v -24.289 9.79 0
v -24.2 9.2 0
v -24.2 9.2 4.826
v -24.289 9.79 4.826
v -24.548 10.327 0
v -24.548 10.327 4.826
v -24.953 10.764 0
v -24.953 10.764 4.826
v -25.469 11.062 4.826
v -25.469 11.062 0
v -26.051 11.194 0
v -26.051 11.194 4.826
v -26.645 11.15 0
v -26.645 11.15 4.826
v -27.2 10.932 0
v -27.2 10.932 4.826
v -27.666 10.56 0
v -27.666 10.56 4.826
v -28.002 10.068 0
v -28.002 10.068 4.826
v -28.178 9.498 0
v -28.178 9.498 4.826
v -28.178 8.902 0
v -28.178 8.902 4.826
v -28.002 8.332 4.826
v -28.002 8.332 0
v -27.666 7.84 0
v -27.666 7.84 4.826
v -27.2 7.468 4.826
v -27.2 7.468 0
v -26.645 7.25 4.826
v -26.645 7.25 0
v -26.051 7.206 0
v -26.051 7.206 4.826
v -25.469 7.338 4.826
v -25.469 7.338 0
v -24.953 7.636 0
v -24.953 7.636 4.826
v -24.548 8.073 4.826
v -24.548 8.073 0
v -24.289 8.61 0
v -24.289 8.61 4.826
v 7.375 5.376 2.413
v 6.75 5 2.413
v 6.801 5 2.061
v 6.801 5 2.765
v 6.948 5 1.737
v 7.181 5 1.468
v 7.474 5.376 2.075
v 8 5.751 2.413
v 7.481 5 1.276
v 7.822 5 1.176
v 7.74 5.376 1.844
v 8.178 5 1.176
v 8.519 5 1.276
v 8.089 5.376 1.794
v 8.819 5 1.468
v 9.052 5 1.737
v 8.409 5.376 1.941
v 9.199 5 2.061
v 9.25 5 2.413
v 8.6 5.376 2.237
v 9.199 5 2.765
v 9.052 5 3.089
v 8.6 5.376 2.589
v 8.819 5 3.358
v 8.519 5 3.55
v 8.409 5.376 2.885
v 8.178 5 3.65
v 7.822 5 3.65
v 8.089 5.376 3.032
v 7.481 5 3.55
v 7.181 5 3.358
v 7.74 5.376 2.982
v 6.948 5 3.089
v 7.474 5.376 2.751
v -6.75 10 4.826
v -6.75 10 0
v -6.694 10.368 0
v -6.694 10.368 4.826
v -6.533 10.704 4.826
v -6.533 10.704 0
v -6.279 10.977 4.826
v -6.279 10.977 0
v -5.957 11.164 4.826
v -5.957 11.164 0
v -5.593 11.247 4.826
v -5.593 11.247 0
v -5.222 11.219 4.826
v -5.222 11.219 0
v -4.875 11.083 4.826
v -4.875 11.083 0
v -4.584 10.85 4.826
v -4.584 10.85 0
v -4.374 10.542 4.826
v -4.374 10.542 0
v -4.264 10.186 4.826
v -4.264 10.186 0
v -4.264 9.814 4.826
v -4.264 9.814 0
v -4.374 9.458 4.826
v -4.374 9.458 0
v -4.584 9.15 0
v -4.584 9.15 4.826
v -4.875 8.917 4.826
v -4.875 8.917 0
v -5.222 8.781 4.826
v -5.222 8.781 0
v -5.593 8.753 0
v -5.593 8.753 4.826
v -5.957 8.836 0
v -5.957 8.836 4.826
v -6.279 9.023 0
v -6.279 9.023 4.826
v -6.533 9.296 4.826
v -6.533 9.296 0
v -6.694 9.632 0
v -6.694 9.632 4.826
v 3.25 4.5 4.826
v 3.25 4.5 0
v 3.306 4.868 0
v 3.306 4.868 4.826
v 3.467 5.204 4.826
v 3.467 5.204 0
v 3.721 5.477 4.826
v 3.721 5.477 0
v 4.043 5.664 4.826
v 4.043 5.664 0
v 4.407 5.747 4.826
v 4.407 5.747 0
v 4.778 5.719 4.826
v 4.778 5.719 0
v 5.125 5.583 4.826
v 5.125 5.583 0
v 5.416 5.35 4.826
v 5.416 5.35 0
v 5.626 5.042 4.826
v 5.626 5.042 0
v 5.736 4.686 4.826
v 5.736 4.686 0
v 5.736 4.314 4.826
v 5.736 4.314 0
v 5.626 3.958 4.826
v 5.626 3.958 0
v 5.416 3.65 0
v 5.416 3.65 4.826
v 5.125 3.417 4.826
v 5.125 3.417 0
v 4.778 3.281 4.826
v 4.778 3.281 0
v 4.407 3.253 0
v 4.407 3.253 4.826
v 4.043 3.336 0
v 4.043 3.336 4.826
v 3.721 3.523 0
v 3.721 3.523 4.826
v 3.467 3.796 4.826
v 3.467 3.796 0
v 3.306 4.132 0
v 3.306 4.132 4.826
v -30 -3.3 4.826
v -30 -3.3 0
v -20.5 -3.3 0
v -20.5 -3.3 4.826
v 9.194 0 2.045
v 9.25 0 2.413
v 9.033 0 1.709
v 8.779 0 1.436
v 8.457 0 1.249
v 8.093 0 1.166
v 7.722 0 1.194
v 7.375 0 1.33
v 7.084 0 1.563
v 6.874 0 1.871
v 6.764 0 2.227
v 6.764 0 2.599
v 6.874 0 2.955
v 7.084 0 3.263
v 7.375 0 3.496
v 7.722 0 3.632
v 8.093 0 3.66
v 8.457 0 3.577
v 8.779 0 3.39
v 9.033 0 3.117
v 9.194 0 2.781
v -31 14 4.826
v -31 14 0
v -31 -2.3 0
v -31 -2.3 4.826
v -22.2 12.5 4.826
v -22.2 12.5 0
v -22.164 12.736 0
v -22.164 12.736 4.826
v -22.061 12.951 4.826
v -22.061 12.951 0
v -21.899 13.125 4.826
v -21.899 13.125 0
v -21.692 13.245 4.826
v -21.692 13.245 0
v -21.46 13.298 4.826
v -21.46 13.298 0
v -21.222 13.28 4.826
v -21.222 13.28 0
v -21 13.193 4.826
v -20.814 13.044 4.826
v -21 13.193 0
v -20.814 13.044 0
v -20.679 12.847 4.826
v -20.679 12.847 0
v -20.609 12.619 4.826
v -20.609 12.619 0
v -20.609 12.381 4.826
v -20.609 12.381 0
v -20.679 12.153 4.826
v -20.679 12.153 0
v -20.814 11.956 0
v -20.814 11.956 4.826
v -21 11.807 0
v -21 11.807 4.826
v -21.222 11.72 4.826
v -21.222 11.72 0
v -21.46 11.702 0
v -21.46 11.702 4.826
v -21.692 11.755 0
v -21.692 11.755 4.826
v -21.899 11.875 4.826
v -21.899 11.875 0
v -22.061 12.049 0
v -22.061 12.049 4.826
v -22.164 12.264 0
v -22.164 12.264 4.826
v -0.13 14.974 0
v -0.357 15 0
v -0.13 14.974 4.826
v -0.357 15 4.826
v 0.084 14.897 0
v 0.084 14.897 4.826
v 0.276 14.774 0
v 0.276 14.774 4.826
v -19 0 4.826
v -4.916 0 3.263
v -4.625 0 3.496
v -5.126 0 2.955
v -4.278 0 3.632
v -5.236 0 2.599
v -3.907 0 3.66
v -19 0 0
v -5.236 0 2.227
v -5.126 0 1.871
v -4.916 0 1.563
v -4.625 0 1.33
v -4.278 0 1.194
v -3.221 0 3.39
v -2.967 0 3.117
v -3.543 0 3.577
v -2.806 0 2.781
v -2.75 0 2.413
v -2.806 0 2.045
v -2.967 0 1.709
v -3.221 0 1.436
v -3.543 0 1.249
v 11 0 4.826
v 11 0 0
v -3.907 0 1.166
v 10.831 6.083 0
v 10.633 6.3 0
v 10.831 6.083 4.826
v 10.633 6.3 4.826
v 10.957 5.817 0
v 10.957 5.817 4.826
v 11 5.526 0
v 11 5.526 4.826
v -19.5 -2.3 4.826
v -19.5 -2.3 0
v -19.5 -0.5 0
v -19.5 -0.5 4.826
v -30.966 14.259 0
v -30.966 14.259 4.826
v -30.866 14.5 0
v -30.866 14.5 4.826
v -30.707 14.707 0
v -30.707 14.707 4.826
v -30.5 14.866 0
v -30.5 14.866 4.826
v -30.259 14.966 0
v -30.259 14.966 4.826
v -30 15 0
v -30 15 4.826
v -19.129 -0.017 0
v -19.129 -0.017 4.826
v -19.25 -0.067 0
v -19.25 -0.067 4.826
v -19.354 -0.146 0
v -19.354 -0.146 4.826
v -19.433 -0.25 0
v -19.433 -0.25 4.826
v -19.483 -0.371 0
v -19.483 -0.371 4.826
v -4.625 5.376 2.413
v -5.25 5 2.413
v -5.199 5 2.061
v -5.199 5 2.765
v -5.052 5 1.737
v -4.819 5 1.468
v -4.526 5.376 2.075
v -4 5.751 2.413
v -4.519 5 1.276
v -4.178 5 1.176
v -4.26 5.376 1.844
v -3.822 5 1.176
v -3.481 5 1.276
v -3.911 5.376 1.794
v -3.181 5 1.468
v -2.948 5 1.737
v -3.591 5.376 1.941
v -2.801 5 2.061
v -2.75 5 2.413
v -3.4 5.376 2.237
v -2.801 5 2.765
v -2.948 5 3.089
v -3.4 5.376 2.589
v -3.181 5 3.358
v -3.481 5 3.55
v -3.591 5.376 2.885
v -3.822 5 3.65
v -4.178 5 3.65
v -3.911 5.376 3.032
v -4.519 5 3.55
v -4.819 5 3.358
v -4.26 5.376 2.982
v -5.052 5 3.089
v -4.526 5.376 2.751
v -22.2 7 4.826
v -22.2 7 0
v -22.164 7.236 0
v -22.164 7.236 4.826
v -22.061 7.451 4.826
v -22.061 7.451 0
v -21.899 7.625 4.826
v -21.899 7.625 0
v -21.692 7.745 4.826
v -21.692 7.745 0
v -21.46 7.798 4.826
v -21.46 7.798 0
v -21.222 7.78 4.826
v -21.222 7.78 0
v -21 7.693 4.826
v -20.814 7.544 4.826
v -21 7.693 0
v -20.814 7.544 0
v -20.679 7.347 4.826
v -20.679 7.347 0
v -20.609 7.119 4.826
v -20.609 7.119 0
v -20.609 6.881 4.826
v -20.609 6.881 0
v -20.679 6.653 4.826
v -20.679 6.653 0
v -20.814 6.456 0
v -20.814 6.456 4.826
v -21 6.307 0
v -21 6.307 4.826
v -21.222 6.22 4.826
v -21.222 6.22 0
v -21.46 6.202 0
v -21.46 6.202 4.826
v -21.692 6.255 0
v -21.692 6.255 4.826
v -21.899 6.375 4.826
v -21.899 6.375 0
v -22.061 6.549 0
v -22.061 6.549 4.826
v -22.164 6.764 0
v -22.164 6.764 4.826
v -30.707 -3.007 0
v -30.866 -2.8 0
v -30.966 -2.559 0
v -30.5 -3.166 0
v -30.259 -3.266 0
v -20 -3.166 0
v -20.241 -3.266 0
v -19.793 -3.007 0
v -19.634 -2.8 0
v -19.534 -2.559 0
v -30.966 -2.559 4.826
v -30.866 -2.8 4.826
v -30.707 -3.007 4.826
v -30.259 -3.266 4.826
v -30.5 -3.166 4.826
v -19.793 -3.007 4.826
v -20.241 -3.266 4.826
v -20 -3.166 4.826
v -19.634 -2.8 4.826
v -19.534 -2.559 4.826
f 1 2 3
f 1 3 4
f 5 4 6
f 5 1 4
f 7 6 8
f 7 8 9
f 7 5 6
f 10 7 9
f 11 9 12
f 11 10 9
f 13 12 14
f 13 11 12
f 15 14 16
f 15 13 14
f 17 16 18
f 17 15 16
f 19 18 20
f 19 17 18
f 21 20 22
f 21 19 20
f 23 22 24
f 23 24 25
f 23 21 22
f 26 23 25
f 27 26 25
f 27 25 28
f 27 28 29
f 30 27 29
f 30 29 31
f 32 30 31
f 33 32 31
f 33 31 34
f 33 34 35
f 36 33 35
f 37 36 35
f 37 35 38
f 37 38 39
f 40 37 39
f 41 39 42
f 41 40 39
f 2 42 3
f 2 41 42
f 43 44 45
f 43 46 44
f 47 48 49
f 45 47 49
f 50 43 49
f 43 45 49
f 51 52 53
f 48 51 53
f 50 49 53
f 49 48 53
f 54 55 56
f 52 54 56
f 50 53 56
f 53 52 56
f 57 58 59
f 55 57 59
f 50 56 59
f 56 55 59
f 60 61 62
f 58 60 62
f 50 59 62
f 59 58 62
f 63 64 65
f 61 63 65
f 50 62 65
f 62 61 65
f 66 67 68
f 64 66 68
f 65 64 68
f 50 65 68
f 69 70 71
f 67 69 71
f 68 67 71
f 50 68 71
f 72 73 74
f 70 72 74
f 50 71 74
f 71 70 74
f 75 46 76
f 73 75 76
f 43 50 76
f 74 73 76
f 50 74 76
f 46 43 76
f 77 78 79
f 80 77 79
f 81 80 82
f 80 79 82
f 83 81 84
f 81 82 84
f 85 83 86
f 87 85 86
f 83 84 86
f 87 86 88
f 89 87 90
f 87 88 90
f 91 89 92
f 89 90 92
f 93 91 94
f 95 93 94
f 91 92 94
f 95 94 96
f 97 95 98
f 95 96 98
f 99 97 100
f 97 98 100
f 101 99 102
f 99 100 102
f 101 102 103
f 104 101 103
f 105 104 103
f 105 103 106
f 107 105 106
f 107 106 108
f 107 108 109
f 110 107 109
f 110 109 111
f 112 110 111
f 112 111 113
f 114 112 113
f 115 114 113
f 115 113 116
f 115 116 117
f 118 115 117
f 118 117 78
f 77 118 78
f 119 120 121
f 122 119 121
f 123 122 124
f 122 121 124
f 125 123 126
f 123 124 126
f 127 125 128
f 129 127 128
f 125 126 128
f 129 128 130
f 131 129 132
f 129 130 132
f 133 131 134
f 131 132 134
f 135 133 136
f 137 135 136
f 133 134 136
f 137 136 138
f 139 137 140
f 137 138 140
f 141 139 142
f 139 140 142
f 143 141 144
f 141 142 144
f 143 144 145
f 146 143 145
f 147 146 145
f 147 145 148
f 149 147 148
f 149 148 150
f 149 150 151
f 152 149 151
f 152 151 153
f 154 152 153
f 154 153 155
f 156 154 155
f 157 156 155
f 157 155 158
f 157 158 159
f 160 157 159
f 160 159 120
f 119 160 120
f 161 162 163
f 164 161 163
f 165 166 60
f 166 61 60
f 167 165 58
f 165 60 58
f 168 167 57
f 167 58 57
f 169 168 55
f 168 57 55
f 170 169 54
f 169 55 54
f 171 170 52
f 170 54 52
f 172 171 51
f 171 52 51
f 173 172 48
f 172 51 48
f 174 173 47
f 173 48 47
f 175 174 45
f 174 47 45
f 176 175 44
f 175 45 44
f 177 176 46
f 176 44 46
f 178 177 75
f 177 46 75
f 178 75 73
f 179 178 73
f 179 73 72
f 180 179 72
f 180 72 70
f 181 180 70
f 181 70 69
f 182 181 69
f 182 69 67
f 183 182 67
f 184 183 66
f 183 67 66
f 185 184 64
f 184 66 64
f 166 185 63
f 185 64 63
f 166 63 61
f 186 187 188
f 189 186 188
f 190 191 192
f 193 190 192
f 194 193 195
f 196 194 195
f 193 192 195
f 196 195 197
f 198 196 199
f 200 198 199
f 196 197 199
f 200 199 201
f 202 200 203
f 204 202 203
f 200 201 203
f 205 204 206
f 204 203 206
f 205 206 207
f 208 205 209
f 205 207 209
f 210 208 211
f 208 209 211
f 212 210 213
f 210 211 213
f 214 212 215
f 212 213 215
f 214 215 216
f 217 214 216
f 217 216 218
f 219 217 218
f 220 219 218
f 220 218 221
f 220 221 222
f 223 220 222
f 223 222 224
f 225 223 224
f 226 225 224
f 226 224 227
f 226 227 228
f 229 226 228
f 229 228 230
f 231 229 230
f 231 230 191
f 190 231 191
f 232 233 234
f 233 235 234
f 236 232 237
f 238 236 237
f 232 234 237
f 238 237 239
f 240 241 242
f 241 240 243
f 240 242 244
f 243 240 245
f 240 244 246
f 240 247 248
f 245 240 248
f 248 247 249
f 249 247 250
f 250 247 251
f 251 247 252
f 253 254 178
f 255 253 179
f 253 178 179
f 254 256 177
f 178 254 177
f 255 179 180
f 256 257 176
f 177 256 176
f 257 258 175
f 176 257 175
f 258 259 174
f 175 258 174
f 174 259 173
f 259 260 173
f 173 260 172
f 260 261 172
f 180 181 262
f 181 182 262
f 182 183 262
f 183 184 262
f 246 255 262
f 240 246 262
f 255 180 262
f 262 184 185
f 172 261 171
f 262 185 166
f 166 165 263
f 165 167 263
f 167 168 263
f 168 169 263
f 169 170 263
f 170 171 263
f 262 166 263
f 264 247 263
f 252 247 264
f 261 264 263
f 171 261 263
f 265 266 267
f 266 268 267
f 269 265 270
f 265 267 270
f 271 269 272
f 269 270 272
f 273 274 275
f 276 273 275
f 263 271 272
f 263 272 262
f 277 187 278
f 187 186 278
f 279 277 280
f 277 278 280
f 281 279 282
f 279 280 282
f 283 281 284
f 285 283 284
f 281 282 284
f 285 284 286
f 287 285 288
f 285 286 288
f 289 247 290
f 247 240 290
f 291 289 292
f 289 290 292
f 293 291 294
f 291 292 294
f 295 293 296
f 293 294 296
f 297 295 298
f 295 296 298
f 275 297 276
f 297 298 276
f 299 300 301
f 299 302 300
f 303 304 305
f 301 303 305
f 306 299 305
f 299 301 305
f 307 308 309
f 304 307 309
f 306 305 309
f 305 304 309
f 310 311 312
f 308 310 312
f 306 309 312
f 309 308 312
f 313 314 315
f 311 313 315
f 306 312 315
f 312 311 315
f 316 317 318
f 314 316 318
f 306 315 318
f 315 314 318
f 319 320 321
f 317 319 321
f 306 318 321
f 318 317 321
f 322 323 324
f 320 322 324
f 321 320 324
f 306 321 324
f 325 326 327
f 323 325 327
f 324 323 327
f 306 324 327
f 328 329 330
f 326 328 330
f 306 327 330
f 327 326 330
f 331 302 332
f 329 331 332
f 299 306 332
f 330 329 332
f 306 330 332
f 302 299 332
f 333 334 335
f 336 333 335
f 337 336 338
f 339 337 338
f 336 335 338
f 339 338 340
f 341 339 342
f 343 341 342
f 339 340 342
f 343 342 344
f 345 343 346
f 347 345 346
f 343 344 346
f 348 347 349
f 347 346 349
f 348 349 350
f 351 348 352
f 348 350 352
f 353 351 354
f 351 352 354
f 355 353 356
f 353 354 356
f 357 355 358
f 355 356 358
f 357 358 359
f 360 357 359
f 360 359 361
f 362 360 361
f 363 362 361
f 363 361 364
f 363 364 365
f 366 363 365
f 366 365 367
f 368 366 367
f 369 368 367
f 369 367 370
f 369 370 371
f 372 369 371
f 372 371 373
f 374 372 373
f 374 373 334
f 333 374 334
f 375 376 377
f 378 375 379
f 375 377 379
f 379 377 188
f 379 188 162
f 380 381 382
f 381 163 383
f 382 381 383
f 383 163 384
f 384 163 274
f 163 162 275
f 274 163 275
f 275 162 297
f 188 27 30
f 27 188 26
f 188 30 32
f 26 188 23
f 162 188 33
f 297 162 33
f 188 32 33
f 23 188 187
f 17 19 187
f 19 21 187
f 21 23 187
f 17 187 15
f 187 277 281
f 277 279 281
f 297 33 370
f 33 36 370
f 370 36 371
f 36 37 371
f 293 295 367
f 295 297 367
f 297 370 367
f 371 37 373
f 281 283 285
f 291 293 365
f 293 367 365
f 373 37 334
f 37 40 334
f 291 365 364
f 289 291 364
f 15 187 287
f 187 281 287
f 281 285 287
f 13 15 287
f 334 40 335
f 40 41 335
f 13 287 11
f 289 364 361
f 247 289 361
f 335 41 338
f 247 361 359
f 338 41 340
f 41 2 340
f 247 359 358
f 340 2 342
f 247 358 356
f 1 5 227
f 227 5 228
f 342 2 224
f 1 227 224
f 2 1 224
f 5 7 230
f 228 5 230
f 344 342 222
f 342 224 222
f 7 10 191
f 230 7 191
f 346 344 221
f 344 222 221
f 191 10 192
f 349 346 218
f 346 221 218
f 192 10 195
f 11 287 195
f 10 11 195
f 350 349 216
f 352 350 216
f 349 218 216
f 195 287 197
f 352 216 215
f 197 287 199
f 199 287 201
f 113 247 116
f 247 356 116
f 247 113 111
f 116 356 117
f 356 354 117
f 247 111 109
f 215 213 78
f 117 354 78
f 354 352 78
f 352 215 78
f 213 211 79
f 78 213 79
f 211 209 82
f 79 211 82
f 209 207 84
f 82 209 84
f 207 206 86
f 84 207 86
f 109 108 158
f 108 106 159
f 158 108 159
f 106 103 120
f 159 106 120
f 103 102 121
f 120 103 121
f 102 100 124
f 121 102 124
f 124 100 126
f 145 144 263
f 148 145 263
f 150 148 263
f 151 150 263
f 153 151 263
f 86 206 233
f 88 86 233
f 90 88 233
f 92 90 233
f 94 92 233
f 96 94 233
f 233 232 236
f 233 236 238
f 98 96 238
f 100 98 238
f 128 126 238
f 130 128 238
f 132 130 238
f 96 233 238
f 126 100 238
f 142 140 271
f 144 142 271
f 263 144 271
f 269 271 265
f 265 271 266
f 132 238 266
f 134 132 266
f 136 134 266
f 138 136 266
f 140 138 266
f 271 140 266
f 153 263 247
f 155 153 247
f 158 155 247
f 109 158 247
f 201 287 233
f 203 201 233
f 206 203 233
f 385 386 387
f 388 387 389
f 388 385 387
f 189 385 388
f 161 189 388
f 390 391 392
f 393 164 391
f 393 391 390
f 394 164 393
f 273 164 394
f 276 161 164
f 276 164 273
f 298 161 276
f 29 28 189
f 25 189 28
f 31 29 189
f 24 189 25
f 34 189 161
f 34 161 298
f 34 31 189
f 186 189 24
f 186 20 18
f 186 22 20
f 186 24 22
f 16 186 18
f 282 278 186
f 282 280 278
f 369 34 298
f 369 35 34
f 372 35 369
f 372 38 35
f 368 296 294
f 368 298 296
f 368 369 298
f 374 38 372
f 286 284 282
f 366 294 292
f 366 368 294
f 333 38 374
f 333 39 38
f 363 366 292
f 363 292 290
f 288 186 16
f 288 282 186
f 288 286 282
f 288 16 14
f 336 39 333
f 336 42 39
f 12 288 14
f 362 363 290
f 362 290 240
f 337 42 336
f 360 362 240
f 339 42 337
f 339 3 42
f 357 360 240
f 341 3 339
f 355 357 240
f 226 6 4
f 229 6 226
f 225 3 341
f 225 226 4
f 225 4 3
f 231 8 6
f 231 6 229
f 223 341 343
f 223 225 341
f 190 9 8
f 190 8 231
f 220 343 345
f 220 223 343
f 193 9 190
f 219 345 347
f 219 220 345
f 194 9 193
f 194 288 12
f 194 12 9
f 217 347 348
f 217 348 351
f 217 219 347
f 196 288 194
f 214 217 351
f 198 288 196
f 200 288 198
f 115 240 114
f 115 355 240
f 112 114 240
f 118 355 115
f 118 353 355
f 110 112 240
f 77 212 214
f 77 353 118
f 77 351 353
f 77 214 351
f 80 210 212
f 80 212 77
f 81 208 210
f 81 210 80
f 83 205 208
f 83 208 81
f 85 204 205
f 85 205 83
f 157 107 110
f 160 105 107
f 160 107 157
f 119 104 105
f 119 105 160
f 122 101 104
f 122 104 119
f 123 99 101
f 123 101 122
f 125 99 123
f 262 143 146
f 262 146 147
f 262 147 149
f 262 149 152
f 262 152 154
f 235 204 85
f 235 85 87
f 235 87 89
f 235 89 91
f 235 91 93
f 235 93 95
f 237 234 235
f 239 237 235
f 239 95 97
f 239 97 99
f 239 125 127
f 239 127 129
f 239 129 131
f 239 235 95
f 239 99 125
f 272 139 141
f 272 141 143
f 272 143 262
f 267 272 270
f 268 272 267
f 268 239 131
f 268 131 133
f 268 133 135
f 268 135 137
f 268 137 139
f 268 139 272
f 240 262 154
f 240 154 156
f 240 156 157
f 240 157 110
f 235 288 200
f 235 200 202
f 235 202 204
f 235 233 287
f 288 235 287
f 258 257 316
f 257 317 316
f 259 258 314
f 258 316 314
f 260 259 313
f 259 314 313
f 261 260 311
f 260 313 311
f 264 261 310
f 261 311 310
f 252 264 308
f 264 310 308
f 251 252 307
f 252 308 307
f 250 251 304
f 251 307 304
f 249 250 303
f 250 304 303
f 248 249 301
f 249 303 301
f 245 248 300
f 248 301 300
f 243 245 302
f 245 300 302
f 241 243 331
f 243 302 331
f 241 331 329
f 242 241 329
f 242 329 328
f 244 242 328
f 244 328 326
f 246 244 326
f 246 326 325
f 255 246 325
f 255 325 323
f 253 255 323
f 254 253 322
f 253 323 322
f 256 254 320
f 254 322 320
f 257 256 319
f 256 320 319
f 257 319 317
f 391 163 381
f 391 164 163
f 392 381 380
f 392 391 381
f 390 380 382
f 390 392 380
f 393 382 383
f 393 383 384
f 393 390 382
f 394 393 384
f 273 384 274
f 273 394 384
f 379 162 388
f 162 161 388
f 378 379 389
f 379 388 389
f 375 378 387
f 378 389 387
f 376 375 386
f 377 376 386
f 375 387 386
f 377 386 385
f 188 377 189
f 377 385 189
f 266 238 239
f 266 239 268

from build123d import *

# Parameters (mm, degrees)
BOSS_EXTRUDE1_DEPTH             = 4.826
M3X0_5_TAPPED_HOLE1_D           = 2.5
TAP_DRILL_FOR_M3X0_5_TAP1_D     = 2.5
TAP_DRILL_FOR_M3X0_5_TAP1_DEPTH = 5
TAP_DRILL_FOR_M3X0_5_TAP1_TIP   = 0.751075774
M3X0_5_TAPPED_HOLE2_D           = 2.5
SKETCH1_3_R                     = 2
BOSS_EXTRUDE2_DEPTH             = 4.826
FILLET1_R                       = 1
M2_TAPPED_HOLES_D               = 1.6
FILLET2_R                       = 0.5


with BuildPart() as part:
    # Sketch1 → Boss-Extrude1 (new body)
    with BuildSketch(Plane.XY):
        Polygon((11, 0), (0, 0), (-11, 0), (-11, 15), (0, 15), (11, 6), align=None)
    extrude(amount=BOSS_EXTRUDE1_DEPTH)

    # M3x0.5 Tapped Hole1 (through all)
    with Locations(Plane.XY.offset(4.826)):
        with Locations((-5.5, 10)):
            Hole(M3X0_5_TAPPED_HOLE1_D / 2)

    # Tap Drill for M3x0.5 Tap1
    with Locations(Plane(origin=(-4, 0, 2.413), x_dir=(-1, 0, 0), z_dir=(0, -1, 0))):
        with Locations((0, 0), (-12, 0)):
            Hole(TAP_DRILL_FOR_M3X0_5_TAP1_D / 2, depth=TAP_DRILL_FOR_M3X0_5_TAP1_DEPTH)
            with Locations((0, 0, -(TAP_DRILL_FOR_M3X0_5_TAP1_DEPTH + TAP_DRILL_FOR_M3X0_5_TAP1_TIP / 2))):  # 118° drill point
                Cone(0, TAP_DRILL_FOR_M3X0_5_TAP1_D / 2, TAP_DRILL_FOR_M3X0_5_TAP1_TIP, mode=Mode.SUBTRACT)

    # M3x0.5 Tapped Hole2 (through all)
    with Locations(Plane(origin=(4.5, 4.5, 4.826), x_dir=(1, 0, 0), z_dir=(0, 0, 1))):
        with Locations((0, 0)):
            Hole(M3X0_5_TAPPED_HOLE2_D / 2)

    # Sketch1<3> → Boss-Extrude2 (add)
    with BuildSketch(Plane.XY):
        Polygon((-19.5, 0), (-11, 0), (-11, 15), (-19.5, 15), (-31, 15), (-31, -3.3), (-19.5, -3.3), align=None)
        with Locations((-26.2, 9.2)):
            Circle(SKETCH1_3_R, mode=Mode.SUBTRACT)
    extrude(amount=BOSS_EXTRUDE2_DEPTH)

    # Fillet1
    fillet1_edges = [part.edges().sort_by_distance(p)[0] for p in [
        (0, 15, 2.413),
        (11, 6, 2.413),
        (-31, 15, 2.413),
        (-31, -3.3, 2.413),
        (-19.5, -3.3, 2.413),
    ]]
    fillet(fillet1_edges, radius=FILLET1_R)

    # M2 Tapped Holes (through all)
    with Locations(Plane.XY.offset(4.826)):
        with Locations((-21.4, 12.5), (-21.4, 7)):
            Hole(M2_TAPPED_HOLES_D / 2)

    # Fillet2
    fillet2_edges = [part.edges().sort_by_distance(p)[0] for p in [
        (-19.5, 0, 2.413),
    ]]
    fillet(fillet2_edges, radius=FILLET2_R)


solid = part.part
